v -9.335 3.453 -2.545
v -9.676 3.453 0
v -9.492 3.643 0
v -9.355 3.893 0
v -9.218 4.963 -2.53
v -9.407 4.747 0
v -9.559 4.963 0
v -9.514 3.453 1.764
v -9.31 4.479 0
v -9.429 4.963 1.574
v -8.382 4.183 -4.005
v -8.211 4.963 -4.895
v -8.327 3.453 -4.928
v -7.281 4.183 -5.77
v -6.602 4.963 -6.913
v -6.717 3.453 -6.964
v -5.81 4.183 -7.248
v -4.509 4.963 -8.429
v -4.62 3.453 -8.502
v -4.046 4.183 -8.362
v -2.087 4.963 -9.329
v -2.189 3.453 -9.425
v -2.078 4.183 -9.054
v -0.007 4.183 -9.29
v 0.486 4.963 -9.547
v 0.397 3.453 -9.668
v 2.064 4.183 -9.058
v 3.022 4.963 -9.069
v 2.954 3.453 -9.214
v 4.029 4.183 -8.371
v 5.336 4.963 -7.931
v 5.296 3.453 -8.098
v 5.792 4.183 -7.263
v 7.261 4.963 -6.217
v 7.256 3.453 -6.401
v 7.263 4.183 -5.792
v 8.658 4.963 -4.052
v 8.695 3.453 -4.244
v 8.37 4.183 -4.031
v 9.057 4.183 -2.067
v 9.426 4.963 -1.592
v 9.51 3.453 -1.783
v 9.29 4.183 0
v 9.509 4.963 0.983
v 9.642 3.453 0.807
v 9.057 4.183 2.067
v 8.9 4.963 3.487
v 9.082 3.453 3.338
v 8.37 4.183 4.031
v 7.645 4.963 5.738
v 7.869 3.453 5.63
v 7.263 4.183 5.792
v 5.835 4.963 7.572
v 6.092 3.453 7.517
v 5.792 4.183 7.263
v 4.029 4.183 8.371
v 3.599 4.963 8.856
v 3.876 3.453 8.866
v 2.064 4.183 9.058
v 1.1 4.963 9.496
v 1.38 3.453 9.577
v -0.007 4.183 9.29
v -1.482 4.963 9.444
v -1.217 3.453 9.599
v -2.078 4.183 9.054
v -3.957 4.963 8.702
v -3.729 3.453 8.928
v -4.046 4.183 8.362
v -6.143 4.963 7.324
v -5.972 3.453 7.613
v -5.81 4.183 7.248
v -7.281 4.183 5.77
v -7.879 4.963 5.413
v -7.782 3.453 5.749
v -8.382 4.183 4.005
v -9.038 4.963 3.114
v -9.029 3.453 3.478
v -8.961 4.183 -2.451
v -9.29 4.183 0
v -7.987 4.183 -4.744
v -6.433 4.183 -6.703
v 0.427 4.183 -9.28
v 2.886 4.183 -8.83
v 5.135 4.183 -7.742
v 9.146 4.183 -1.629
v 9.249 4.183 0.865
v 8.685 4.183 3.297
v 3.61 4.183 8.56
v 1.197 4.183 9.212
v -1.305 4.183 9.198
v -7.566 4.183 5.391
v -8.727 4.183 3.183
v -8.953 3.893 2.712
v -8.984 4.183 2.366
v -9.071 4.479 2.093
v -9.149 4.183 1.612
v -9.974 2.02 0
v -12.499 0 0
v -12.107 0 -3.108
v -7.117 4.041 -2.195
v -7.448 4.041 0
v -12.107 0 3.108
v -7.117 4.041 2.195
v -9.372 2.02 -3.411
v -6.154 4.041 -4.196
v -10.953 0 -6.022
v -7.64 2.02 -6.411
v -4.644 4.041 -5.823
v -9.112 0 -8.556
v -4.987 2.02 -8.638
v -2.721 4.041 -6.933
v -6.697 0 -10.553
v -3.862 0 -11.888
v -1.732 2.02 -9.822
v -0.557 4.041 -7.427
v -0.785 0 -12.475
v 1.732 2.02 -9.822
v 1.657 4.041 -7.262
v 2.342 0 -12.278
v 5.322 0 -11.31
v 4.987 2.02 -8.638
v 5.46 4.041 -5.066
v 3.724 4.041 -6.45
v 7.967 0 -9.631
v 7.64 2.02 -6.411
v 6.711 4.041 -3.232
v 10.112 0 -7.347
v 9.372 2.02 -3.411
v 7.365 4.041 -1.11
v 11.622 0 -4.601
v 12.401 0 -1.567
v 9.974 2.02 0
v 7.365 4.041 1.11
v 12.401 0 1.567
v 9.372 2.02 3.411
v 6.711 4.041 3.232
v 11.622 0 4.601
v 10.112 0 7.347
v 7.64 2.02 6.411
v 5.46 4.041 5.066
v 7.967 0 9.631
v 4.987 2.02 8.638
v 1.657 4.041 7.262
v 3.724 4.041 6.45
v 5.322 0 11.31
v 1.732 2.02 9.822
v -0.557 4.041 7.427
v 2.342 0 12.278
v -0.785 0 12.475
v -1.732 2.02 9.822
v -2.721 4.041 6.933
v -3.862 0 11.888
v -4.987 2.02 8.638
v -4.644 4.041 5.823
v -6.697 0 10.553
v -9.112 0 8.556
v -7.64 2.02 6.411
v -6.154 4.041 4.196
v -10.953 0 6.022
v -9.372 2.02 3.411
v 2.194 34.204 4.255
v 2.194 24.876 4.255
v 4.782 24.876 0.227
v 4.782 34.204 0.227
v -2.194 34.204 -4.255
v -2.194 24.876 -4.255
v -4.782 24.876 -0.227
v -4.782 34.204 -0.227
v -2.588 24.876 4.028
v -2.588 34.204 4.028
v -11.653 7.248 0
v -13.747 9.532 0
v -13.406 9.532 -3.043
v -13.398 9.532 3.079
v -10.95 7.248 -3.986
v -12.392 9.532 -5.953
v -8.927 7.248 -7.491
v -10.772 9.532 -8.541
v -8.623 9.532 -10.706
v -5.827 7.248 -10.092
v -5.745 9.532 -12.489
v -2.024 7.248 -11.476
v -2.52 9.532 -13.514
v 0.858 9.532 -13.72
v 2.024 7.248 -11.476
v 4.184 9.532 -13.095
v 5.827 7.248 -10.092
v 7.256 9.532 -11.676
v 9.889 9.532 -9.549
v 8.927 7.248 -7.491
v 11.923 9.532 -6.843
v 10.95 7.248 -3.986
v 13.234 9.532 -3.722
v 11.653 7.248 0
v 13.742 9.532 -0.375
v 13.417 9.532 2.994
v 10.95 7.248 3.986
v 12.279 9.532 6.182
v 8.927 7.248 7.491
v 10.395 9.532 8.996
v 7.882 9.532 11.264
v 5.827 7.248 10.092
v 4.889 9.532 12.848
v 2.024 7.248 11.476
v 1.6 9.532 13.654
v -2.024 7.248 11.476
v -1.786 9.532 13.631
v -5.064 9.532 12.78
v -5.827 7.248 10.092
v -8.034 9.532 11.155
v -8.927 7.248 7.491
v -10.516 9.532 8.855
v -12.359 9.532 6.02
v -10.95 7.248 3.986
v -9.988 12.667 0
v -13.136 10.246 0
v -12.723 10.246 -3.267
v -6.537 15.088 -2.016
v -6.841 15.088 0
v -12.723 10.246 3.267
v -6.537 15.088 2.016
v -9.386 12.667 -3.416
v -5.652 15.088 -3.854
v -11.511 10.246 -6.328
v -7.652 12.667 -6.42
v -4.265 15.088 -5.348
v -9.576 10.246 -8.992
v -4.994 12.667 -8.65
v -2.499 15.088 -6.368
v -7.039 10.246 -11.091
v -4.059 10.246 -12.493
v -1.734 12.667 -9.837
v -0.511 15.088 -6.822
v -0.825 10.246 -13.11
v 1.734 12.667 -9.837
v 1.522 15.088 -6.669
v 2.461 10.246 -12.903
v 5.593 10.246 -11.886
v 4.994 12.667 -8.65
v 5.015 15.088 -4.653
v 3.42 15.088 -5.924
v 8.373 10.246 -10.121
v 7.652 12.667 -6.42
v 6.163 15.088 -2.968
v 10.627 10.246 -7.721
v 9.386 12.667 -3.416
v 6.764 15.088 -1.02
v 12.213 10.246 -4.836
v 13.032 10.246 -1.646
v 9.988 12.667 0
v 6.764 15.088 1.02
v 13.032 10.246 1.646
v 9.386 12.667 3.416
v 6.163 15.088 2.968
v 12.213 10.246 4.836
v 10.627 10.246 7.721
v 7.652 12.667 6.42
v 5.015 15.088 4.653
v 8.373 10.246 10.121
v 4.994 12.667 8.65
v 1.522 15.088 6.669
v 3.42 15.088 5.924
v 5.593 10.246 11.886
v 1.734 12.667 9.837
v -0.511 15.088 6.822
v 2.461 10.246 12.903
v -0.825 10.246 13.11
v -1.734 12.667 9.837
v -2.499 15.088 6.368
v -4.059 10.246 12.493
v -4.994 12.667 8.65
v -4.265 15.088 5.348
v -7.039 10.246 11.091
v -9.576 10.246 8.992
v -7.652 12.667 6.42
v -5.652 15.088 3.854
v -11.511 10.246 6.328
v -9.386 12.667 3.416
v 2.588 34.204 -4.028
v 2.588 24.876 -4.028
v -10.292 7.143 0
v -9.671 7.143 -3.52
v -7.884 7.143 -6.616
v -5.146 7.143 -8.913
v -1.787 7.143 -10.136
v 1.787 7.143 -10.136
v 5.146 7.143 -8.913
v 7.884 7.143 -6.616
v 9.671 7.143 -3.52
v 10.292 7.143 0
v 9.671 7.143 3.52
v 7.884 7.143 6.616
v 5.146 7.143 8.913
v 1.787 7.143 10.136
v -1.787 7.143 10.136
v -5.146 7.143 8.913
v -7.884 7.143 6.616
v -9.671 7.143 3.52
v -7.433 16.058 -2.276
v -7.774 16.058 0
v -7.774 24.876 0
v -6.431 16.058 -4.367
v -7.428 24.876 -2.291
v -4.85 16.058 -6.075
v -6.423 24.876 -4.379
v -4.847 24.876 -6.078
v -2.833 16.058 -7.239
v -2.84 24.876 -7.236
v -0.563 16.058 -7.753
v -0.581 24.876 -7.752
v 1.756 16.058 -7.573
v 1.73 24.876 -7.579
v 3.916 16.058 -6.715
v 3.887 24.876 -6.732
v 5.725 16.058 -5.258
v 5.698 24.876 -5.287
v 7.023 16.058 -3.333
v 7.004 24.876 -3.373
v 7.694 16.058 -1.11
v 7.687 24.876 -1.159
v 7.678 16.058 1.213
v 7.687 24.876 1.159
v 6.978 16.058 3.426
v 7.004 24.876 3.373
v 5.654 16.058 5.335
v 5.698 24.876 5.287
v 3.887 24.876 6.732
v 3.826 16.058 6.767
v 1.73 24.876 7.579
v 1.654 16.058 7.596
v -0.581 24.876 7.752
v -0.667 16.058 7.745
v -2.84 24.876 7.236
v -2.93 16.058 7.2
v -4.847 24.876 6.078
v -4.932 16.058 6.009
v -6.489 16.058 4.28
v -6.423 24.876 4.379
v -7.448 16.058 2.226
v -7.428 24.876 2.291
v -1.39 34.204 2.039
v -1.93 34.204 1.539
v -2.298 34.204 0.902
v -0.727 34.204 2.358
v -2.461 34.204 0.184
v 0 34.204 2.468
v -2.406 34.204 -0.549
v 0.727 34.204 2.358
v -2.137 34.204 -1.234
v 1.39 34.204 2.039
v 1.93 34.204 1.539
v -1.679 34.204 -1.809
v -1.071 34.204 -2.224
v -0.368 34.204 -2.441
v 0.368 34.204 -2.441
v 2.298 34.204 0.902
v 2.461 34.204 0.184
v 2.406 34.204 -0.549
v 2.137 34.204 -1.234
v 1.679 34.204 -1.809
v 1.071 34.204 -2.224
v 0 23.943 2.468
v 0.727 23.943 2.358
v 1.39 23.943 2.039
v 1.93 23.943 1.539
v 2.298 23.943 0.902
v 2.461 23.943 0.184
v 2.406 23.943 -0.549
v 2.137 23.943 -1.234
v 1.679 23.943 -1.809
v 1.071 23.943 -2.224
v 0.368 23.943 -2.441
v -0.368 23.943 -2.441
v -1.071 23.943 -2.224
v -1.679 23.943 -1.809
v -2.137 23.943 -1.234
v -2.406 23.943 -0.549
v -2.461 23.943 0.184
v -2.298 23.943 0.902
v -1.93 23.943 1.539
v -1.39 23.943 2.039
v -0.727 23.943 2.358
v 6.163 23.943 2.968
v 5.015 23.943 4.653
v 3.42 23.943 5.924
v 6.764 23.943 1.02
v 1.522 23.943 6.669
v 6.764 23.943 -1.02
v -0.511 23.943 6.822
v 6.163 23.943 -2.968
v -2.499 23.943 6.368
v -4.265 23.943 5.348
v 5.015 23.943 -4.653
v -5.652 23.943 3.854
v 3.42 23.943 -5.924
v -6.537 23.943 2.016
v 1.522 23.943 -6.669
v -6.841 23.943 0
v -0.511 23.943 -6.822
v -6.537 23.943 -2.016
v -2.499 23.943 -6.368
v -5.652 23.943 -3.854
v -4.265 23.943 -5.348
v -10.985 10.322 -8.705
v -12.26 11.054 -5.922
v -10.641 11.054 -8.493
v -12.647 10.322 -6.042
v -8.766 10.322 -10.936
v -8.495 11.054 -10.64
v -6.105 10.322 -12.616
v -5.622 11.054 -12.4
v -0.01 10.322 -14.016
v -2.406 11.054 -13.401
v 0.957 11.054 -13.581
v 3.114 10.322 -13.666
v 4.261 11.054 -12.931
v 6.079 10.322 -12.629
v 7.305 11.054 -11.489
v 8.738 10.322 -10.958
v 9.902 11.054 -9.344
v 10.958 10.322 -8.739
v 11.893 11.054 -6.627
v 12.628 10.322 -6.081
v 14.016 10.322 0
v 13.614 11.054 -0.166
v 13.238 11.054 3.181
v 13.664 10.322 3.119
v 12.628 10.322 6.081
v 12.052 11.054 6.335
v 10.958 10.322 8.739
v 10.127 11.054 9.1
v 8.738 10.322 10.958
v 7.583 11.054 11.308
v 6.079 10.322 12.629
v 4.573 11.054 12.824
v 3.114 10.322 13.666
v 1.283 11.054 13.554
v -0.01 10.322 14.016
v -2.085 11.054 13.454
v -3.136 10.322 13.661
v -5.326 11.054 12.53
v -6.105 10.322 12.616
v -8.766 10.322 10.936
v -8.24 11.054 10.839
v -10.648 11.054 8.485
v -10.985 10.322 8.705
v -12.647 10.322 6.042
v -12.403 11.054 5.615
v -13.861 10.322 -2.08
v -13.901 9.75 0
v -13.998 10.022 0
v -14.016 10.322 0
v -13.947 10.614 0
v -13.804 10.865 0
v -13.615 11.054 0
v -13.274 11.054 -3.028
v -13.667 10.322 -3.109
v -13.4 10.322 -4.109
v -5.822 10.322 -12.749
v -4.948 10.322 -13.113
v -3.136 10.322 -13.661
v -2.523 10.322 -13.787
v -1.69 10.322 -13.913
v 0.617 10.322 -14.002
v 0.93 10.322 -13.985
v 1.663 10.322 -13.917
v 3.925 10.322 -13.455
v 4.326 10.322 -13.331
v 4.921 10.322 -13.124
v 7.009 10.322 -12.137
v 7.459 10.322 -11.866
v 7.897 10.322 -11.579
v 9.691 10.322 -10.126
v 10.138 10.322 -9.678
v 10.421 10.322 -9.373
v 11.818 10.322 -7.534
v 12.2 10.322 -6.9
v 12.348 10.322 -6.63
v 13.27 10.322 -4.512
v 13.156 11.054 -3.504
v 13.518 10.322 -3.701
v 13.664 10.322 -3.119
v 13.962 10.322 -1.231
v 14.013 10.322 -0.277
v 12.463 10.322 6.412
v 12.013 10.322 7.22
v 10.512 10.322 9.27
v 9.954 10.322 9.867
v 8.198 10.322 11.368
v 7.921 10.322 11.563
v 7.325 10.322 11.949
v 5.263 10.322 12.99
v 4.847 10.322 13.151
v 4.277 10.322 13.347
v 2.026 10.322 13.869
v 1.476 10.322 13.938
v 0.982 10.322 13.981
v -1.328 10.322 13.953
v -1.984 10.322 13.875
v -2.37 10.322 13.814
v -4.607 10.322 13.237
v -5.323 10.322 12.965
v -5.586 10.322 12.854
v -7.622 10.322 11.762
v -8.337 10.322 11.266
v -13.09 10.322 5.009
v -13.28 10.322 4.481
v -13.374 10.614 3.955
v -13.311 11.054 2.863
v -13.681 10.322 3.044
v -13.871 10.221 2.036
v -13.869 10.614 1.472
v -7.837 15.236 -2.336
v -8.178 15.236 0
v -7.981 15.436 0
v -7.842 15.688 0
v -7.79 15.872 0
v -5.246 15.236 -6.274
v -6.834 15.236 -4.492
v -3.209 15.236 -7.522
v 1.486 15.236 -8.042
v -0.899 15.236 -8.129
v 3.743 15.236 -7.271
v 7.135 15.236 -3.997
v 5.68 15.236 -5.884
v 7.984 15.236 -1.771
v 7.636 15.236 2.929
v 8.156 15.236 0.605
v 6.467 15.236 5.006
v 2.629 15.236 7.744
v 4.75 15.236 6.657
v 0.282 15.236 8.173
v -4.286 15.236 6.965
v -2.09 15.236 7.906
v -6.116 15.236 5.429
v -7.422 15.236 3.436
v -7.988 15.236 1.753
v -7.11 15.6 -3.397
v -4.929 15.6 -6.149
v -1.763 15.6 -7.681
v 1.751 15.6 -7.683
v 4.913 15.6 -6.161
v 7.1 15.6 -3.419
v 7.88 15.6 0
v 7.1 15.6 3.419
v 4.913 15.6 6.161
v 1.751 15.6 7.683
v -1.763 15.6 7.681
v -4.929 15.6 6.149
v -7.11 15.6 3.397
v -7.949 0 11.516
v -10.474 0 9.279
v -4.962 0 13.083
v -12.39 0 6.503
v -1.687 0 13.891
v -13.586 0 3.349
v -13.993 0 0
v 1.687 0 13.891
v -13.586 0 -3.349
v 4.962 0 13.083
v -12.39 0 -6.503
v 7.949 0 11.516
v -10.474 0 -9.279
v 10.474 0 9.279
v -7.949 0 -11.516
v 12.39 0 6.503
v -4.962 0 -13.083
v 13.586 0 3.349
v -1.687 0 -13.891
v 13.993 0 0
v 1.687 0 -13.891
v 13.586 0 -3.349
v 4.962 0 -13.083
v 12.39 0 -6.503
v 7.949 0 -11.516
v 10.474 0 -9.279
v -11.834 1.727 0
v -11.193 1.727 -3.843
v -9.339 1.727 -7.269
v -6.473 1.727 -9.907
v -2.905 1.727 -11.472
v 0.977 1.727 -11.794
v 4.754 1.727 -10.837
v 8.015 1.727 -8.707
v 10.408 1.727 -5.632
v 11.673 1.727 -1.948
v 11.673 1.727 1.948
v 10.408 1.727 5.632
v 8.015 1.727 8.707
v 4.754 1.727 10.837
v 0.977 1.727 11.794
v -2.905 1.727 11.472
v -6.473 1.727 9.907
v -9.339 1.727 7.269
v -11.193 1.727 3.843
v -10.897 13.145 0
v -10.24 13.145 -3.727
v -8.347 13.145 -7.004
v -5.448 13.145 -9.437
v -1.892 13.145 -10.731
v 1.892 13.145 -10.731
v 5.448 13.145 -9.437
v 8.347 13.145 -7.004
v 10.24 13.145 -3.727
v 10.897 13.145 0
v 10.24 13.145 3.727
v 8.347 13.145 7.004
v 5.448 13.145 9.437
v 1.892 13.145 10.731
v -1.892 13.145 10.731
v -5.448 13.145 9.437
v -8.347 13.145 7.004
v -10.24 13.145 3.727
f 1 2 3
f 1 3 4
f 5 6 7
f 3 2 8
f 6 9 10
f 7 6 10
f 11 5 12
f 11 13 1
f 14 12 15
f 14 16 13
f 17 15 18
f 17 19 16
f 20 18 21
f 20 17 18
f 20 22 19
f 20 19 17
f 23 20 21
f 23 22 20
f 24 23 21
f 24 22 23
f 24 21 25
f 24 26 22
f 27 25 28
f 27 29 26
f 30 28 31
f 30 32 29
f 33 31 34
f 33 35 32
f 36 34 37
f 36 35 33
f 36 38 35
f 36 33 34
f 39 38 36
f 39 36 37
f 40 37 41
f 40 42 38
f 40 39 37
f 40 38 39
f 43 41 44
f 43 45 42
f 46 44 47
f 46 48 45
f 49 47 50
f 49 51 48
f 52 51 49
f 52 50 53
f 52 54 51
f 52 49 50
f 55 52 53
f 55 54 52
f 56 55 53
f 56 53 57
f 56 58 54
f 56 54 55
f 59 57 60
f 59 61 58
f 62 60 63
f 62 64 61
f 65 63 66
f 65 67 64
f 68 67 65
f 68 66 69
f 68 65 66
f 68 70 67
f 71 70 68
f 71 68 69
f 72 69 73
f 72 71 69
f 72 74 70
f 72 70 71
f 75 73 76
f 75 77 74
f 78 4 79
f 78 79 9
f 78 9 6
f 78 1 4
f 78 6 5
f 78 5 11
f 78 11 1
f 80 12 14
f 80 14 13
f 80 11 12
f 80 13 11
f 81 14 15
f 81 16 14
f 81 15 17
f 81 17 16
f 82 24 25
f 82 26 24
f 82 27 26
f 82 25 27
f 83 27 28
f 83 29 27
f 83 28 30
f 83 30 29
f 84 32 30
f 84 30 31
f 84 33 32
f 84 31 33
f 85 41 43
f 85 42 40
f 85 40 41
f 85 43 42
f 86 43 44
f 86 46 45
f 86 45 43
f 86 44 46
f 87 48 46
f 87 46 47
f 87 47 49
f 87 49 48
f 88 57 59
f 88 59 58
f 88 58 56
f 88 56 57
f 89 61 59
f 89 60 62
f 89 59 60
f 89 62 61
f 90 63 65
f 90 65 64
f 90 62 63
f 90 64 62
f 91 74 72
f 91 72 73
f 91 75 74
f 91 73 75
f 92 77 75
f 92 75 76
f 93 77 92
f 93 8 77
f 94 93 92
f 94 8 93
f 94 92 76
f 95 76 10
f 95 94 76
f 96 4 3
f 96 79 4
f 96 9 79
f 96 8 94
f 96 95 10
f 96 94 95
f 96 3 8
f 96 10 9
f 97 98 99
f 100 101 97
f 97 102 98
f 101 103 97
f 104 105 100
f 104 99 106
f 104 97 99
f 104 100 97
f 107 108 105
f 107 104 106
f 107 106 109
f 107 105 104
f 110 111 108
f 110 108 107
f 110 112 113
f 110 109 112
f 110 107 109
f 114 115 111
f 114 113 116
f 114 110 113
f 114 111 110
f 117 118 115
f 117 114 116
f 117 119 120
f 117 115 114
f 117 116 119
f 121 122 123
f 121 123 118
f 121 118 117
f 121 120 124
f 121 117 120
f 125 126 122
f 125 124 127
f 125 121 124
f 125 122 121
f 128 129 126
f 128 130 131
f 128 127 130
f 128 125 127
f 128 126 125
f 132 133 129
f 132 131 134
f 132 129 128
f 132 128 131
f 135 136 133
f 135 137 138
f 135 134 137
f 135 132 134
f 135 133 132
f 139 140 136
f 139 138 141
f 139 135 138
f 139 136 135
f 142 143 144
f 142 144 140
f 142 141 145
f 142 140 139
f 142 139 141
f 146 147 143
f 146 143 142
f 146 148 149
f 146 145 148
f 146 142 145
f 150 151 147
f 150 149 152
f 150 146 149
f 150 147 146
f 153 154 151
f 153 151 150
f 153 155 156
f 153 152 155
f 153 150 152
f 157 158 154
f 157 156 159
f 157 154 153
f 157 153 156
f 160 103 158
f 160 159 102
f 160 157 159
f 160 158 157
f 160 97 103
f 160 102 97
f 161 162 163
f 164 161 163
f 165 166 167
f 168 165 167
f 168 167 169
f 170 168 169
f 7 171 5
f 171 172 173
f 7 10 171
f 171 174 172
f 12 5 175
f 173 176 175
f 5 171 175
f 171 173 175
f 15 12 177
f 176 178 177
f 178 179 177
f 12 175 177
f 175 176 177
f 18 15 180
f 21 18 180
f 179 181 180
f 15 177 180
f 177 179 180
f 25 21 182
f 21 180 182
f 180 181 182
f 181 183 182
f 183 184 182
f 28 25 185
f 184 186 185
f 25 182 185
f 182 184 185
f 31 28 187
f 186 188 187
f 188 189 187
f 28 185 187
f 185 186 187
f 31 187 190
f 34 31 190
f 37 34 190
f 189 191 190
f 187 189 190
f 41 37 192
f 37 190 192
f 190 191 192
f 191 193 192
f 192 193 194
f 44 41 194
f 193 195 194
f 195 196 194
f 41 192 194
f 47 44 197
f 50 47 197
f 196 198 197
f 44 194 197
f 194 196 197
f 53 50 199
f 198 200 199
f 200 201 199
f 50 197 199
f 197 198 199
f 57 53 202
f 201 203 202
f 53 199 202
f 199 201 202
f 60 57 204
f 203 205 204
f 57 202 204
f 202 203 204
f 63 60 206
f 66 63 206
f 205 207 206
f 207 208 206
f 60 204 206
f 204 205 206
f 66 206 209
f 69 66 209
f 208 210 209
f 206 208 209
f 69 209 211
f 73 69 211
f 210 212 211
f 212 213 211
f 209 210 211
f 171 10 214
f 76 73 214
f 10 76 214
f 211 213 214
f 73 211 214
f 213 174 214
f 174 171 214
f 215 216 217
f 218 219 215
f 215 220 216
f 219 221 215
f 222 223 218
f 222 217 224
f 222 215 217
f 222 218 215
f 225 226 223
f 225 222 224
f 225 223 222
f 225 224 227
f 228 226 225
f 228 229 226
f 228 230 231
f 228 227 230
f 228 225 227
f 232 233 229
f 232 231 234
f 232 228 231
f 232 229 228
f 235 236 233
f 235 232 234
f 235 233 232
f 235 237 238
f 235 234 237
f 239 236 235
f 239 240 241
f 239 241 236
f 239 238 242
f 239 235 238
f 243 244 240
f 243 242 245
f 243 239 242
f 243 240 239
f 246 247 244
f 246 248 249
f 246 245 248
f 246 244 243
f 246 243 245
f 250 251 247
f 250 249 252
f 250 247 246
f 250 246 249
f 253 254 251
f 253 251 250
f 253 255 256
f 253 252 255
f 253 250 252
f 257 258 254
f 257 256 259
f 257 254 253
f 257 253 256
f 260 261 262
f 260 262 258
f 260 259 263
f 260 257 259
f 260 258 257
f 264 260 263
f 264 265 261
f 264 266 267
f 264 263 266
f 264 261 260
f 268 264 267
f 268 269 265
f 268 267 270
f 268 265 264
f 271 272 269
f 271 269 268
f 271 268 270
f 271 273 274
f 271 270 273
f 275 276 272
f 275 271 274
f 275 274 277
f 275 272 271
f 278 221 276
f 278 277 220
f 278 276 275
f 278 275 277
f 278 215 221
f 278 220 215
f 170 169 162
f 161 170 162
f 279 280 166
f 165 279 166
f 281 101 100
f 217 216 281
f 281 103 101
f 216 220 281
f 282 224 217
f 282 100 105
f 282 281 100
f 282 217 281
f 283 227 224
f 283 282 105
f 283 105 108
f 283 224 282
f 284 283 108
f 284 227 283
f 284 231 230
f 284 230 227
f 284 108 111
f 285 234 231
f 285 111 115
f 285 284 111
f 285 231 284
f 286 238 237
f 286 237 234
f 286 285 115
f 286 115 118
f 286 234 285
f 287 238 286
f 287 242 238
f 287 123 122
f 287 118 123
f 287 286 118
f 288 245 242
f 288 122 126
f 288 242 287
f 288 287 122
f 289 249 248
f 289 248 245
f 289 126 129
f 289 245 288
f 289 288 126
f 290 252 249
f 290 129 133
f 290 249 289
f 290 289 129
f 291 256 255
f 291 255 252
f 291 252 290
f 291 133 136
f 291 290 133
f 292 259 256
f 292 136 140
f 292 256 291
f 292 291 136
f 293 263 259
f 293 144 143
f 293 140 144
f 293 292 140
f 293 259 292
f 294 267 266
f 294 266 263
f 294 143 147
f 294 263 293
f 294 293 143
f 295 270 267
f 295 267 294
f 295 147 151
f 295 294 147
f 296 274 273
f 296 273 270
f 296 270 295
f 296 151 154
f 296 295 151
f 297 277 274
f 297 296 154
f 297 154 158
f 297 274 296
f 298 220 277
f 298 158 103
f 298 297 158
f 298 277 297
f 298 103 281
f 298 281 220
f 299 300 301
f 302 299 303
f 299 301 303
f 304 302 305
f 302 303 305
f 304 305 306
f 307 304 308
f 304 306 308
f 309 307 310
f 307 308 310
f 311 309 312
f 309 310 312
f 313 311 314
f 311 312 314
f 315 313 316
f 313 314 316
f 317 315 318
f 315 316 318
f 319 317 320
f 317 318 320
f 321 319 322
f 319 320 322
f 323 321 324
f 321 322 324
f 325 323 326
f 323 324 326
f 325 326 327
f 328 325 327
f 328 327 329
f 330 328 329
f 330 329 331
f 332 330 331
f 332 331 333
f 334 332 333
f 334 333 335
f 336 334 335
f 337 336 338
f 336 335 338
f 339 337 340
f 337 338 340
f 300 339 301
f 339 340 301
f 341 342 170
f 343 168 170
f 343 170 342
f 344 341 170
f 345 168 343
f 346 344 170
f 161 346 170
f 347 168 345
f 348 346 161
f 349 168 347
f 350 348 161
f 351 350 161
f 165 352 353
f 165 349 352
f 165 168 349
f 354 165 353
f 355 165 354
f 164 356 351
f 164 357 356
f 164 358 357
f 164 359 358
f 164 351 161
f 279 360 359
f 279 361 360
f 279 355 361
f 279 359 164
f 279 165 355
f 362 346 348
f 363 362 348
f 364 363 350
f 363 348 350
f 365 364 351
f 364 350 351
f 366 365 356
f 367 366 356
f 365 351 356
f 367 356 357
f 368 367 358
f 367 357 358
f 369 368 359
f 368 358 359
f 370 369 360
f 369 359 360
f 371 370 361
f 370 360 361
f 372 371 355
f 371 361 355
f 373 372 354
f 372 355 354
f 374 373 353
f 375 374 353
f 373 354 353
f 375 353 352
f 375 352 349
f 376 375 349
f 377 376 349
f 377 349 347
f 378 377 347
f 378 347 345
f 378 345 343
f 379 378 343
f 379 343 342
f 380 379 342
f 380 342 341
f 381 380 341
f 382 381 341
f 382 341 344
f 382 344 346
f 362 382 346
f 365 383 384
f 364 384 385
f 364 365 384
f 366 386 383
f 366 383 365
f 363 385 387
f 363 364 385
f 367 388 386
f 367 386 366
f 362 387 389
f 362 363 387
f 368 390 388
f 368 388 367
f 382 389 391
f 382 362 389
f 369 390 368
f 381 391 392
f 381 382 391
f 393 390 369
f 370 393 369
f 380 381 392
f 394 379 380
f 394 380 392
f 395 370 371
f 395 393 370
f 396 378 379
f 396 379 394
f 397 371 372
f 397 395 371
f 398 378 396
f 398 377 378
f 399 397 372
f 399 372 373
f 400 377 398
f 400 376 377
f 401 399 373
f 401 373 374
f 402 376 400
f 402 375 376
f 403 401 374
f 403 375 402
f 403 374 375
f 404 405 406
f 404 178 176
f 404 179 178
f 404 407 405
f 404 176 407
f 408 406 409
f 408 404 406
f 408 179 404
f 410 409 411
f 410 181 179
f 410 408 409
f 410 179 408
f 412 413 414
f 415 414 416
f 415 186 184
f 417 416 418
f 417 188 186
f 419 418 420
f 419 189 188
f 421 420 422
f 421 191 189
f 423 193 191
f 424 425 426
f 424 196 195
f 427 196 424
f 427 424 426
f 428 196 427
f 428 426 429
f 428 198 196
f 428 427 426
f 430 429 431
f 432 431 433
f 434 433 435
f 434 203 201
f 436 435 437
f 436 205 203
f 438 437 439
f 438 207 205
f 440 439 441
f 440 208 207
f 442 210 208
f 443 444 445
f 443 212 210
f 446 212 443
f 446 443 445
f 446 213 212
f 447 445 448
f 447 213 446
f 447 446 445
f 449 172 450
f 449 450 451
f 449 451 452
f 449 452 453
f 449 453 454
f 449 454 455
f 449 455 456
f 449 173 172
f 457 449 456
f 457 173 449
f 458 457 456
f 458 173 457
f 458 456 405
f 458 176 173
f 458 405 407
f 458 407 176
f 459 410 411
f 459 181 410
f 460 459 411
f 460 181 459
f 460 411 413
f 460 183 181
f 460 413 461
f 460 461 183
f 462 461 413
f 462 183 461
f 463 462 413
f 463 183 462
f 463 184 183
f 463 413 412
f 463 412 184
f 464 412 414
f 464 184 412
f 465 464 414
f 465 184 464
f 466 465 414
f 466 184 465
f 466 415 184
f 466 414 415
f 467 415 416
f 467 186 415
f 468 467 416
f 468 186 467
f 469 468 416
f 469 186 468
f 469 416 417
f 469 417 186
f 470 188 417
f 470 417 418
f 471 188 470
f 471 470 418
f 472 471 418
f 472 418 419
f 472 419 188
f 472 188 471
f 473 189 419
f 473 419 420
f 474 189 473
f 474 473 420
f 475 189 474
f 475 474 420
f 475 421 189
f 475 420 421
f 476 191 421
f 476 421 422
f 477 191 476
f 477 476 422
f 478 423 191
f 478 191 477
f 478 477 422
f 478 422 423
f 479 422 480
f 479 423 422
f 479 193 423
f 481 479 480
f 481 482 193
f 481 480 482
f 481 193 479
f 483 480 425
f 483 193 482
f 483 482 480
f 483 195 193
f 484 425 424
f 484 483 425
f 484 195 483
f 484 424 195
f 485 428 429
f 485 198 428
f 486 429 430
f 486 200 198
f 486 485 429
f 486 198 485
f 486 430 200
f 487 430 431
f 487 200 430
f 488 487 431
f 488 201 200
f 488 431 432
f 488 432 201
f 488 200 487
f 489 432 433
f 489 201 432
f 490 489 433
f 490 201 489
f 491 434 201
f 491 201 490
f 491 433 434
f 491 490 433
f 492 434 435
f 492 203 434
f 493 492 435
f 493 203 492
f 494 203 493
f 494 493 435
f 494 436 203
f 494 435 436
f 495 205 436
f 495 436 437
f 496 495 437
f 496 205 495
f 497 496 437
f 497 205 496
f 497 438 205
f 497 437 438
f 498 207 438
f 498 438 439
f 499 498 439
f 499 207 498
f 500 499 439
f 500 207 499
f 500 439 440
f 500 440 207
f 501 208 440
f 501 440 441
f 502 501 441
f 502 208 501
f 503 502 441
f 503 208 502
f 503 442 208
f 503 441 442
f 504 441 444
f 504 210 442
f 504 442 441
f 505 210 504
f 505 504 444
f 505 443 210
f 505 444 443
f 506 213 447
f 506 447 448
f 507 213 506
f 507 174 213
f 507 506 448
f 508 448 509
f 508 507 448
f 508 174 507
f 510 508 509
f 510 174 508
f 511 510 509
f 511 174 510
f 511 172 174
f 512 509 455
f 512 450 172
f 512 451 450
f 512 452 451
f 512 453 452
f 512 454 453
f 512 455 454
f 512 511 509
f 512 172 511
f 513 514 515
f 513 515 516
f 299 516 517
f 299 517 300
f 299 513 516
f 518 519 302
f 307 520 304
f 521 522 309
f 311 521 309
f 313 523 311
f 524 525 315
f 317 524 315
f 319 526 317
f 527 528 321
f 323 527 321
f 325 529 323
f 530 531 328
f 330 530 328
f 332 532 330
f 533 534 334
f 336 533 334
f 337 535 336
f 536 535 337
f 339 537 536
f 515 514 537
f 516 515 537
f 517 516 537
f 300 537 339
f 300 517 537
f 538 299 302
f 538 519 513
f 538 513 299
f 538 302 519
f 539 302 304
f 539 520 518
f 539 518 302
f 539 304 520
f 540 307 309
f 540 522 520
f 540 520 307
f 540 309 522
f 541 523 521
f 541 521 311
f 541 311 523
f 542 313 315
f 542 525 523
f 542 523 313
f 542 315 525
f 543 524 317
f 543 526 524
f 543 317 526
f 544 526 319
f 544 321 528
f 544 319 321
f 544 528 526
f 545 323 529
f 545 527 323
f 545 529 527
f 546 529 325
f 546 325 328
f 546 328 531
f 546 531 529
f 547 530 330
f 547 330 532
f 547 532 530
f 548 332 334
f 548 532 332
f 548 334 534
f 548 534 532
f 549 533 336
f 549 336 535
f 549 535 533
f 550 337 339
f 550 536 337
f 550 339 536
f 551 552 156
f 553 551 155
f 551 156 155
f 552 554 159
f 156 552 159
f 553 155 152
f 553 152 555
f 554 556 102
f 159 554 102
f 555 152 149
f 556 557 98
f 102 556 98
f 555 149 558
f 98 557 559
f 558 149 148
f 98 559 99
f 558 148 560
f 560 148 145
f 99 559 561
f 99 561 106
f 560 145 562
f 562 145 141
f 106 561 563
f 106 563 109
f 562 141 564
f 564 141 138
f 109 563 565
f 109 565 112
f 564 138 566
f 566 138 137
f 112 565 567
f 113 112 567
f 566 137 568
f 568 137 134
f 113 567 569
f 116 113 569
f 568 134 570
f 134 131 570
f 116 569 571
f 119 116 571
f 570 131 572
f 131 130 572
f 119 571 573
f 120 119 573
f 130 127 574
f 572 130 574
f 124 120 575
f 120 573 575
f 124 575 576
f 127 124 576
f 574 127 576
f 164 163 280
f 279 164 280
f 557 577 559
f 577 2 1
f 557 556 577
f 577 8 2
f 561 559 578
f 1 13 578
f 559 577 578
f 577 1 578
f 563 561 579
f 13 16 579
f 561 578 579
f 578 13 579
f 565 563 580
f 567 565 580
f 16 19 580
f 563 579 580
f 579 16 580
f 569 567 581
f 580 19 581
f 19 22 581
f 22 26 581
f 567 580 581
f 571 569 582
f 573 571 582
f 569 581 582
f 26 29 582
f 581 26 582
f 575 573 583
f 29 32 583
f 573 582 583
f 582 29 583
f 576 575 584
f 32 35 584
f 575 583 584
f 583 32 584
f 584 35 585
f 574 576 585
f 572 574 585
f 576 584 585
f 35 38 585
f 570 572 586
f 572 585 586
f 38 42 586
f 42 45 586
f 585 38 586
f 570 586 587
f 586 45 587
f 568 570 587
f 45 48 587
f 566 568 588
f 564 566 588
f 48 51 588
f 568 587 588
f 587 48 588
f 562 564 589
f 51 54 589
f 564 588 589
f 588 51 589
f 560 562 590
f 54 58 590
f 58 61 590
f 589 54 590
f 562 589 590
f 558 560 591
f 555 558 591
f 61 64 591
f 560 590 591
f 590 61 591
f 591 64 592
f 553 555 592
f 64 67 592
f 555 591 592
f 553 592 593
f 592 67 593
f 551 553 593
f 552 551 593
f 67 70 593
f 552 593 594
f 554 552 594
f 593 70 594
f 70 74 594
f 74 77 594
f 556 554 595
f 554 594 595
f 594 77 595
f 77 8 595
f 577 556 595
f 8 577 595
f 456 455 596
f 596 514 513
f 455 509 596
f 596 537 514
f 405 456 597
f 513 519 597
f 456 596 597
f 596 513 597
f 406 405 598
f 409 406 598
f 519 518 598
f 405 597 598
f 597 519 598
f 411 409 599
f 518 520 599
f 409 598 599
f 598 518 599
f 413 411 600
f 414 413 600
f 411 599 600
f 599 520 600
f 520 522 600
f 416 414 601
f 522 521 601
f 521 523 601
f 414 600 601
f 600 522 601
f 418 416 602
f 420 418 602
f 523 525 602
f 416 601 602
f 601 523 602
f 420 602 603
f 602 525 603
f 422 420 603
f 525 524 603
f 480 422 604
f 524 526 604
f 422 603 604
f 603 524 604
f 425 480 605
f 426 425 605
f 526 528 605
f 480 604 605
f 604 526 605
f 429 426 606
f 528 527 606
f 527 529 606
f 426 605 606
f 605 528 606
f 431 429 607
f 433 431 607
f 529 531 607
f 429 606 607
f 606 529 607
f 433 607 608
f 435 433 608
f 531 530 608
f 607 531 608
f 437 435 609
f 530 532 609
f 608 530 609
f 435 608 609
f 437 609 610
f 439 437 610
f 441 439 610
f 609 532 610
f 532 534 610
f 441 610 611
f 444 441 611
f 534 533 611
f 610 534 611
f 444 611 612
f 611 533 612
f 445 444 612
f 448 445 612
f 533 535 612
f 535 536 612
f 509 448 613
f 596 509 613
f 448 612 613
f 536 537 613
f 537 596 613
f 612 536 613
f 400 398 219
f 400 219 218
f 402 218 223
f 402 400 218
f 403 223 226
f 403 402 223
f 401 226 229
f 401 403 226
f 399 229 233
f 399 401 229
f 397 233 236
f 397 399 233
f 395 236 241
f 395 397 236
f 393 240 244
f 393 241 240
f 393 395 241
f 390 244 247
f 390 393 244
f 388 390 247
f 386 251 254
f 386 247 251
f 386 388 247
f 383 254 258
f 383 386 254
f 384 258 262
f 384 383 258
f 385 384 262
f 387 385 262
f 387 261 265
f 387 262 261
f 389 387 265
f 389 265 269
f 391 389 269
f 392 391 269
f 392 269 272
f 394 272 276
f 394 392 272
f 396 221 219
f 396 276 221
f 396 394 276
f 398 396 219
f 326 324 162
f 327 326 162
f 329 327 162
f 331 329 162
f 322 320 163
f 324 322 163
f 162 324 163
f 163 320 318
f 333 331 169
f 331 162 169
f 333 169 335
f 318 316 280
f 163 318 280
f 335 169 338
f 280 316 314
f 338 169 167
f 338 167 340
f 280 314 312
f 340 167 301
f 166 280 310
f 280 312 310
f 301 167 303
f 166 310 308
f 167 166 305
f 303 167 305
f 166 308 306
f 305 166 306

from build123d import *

# Parameters (mm, degrees)
CASCA1_T                 = -0.9
RESSALTO_EXTRUS_O1_DEPTH = 9
FILETE1_R                = 1
ESBO_O3_R                = 2.38125
CORTE_EXTRUS_O1_DEPTH    = 39.143338529
SCALE1_SCALE             = 1.036484245


with BuildPart() as part:
    # Esboço1 → Revolução1 (revolve)
    with BuildSketch(Plane.XY, mode=Mode.PRIVATE) as revolu_o1_sk:
        Polygon((0, 0), (13.5, 0), (8.5, 4), (14, 10), (7.5, 15), (7.5, 24), (0, 24), align=None)
    revolve(revolu_o1_sk.sketch.rotate(Axis((0, 24, 0), (0, -1, 0)), 180), axis=Axis((0, 24, 0), (0, -1, 0)))

    # Casca1
    casca1_openings = [part.faces().sort_by_distance(p)[0] for p in [
        (0, 0, 0),
    ]]
    offset(amount=CASCA1_T, openings=casca1_openings, kind=Kind.INTERSECTION)

    # Esboço2 → Ressalto-extrusão1 (add)
    with BuildSketch(Plane(origin=(0, 24, 0), x_dir=(1, 0, 0), z_dir=(0, 1, 0))):
        Polygon((2.496763598, 3.885808136), (-2.11682676, 4.105164771), (-4.613590359, 0.219356636), (-2.496763598, -3.885808136), (2.11682676, -4.105164771), (4.613590359, -0.219356636), align=None)
    extrude(amount=RESSALTO_EXTRUS_O1_DEPTH)

    # Filete1
    filete1_edges = [part.edges().sort_by_distance(p)[0] for p in [
        (7.5, 15, 0),
        (14, 10, 0),
        (8.5, 4, 0),
    ]]
    fillet(filete1_edges, radius=FILETE1_R)

    # Esboço3 → Corte-extrusão1 (cut, through all)
    with BuildSketch(Plane(origin=(0, 33, 0), x_dir=(1, 0, 0), z_dir=(0, 1, 0))):
        with Locations(Location((0, 0, 0), (0, 0, 270))):
            Circle(ESBO_O3_R)
    extrude(amount=-CORTE_EXTRUS_O1_DEPTH, mode=Mode.SUBTRACT)


with BuildPart() as part_1:
    # Scale1: scaled about (0, 0, 0)
    add(part.part.scale(SCALE1_SCALE))


solid = part_1.part
